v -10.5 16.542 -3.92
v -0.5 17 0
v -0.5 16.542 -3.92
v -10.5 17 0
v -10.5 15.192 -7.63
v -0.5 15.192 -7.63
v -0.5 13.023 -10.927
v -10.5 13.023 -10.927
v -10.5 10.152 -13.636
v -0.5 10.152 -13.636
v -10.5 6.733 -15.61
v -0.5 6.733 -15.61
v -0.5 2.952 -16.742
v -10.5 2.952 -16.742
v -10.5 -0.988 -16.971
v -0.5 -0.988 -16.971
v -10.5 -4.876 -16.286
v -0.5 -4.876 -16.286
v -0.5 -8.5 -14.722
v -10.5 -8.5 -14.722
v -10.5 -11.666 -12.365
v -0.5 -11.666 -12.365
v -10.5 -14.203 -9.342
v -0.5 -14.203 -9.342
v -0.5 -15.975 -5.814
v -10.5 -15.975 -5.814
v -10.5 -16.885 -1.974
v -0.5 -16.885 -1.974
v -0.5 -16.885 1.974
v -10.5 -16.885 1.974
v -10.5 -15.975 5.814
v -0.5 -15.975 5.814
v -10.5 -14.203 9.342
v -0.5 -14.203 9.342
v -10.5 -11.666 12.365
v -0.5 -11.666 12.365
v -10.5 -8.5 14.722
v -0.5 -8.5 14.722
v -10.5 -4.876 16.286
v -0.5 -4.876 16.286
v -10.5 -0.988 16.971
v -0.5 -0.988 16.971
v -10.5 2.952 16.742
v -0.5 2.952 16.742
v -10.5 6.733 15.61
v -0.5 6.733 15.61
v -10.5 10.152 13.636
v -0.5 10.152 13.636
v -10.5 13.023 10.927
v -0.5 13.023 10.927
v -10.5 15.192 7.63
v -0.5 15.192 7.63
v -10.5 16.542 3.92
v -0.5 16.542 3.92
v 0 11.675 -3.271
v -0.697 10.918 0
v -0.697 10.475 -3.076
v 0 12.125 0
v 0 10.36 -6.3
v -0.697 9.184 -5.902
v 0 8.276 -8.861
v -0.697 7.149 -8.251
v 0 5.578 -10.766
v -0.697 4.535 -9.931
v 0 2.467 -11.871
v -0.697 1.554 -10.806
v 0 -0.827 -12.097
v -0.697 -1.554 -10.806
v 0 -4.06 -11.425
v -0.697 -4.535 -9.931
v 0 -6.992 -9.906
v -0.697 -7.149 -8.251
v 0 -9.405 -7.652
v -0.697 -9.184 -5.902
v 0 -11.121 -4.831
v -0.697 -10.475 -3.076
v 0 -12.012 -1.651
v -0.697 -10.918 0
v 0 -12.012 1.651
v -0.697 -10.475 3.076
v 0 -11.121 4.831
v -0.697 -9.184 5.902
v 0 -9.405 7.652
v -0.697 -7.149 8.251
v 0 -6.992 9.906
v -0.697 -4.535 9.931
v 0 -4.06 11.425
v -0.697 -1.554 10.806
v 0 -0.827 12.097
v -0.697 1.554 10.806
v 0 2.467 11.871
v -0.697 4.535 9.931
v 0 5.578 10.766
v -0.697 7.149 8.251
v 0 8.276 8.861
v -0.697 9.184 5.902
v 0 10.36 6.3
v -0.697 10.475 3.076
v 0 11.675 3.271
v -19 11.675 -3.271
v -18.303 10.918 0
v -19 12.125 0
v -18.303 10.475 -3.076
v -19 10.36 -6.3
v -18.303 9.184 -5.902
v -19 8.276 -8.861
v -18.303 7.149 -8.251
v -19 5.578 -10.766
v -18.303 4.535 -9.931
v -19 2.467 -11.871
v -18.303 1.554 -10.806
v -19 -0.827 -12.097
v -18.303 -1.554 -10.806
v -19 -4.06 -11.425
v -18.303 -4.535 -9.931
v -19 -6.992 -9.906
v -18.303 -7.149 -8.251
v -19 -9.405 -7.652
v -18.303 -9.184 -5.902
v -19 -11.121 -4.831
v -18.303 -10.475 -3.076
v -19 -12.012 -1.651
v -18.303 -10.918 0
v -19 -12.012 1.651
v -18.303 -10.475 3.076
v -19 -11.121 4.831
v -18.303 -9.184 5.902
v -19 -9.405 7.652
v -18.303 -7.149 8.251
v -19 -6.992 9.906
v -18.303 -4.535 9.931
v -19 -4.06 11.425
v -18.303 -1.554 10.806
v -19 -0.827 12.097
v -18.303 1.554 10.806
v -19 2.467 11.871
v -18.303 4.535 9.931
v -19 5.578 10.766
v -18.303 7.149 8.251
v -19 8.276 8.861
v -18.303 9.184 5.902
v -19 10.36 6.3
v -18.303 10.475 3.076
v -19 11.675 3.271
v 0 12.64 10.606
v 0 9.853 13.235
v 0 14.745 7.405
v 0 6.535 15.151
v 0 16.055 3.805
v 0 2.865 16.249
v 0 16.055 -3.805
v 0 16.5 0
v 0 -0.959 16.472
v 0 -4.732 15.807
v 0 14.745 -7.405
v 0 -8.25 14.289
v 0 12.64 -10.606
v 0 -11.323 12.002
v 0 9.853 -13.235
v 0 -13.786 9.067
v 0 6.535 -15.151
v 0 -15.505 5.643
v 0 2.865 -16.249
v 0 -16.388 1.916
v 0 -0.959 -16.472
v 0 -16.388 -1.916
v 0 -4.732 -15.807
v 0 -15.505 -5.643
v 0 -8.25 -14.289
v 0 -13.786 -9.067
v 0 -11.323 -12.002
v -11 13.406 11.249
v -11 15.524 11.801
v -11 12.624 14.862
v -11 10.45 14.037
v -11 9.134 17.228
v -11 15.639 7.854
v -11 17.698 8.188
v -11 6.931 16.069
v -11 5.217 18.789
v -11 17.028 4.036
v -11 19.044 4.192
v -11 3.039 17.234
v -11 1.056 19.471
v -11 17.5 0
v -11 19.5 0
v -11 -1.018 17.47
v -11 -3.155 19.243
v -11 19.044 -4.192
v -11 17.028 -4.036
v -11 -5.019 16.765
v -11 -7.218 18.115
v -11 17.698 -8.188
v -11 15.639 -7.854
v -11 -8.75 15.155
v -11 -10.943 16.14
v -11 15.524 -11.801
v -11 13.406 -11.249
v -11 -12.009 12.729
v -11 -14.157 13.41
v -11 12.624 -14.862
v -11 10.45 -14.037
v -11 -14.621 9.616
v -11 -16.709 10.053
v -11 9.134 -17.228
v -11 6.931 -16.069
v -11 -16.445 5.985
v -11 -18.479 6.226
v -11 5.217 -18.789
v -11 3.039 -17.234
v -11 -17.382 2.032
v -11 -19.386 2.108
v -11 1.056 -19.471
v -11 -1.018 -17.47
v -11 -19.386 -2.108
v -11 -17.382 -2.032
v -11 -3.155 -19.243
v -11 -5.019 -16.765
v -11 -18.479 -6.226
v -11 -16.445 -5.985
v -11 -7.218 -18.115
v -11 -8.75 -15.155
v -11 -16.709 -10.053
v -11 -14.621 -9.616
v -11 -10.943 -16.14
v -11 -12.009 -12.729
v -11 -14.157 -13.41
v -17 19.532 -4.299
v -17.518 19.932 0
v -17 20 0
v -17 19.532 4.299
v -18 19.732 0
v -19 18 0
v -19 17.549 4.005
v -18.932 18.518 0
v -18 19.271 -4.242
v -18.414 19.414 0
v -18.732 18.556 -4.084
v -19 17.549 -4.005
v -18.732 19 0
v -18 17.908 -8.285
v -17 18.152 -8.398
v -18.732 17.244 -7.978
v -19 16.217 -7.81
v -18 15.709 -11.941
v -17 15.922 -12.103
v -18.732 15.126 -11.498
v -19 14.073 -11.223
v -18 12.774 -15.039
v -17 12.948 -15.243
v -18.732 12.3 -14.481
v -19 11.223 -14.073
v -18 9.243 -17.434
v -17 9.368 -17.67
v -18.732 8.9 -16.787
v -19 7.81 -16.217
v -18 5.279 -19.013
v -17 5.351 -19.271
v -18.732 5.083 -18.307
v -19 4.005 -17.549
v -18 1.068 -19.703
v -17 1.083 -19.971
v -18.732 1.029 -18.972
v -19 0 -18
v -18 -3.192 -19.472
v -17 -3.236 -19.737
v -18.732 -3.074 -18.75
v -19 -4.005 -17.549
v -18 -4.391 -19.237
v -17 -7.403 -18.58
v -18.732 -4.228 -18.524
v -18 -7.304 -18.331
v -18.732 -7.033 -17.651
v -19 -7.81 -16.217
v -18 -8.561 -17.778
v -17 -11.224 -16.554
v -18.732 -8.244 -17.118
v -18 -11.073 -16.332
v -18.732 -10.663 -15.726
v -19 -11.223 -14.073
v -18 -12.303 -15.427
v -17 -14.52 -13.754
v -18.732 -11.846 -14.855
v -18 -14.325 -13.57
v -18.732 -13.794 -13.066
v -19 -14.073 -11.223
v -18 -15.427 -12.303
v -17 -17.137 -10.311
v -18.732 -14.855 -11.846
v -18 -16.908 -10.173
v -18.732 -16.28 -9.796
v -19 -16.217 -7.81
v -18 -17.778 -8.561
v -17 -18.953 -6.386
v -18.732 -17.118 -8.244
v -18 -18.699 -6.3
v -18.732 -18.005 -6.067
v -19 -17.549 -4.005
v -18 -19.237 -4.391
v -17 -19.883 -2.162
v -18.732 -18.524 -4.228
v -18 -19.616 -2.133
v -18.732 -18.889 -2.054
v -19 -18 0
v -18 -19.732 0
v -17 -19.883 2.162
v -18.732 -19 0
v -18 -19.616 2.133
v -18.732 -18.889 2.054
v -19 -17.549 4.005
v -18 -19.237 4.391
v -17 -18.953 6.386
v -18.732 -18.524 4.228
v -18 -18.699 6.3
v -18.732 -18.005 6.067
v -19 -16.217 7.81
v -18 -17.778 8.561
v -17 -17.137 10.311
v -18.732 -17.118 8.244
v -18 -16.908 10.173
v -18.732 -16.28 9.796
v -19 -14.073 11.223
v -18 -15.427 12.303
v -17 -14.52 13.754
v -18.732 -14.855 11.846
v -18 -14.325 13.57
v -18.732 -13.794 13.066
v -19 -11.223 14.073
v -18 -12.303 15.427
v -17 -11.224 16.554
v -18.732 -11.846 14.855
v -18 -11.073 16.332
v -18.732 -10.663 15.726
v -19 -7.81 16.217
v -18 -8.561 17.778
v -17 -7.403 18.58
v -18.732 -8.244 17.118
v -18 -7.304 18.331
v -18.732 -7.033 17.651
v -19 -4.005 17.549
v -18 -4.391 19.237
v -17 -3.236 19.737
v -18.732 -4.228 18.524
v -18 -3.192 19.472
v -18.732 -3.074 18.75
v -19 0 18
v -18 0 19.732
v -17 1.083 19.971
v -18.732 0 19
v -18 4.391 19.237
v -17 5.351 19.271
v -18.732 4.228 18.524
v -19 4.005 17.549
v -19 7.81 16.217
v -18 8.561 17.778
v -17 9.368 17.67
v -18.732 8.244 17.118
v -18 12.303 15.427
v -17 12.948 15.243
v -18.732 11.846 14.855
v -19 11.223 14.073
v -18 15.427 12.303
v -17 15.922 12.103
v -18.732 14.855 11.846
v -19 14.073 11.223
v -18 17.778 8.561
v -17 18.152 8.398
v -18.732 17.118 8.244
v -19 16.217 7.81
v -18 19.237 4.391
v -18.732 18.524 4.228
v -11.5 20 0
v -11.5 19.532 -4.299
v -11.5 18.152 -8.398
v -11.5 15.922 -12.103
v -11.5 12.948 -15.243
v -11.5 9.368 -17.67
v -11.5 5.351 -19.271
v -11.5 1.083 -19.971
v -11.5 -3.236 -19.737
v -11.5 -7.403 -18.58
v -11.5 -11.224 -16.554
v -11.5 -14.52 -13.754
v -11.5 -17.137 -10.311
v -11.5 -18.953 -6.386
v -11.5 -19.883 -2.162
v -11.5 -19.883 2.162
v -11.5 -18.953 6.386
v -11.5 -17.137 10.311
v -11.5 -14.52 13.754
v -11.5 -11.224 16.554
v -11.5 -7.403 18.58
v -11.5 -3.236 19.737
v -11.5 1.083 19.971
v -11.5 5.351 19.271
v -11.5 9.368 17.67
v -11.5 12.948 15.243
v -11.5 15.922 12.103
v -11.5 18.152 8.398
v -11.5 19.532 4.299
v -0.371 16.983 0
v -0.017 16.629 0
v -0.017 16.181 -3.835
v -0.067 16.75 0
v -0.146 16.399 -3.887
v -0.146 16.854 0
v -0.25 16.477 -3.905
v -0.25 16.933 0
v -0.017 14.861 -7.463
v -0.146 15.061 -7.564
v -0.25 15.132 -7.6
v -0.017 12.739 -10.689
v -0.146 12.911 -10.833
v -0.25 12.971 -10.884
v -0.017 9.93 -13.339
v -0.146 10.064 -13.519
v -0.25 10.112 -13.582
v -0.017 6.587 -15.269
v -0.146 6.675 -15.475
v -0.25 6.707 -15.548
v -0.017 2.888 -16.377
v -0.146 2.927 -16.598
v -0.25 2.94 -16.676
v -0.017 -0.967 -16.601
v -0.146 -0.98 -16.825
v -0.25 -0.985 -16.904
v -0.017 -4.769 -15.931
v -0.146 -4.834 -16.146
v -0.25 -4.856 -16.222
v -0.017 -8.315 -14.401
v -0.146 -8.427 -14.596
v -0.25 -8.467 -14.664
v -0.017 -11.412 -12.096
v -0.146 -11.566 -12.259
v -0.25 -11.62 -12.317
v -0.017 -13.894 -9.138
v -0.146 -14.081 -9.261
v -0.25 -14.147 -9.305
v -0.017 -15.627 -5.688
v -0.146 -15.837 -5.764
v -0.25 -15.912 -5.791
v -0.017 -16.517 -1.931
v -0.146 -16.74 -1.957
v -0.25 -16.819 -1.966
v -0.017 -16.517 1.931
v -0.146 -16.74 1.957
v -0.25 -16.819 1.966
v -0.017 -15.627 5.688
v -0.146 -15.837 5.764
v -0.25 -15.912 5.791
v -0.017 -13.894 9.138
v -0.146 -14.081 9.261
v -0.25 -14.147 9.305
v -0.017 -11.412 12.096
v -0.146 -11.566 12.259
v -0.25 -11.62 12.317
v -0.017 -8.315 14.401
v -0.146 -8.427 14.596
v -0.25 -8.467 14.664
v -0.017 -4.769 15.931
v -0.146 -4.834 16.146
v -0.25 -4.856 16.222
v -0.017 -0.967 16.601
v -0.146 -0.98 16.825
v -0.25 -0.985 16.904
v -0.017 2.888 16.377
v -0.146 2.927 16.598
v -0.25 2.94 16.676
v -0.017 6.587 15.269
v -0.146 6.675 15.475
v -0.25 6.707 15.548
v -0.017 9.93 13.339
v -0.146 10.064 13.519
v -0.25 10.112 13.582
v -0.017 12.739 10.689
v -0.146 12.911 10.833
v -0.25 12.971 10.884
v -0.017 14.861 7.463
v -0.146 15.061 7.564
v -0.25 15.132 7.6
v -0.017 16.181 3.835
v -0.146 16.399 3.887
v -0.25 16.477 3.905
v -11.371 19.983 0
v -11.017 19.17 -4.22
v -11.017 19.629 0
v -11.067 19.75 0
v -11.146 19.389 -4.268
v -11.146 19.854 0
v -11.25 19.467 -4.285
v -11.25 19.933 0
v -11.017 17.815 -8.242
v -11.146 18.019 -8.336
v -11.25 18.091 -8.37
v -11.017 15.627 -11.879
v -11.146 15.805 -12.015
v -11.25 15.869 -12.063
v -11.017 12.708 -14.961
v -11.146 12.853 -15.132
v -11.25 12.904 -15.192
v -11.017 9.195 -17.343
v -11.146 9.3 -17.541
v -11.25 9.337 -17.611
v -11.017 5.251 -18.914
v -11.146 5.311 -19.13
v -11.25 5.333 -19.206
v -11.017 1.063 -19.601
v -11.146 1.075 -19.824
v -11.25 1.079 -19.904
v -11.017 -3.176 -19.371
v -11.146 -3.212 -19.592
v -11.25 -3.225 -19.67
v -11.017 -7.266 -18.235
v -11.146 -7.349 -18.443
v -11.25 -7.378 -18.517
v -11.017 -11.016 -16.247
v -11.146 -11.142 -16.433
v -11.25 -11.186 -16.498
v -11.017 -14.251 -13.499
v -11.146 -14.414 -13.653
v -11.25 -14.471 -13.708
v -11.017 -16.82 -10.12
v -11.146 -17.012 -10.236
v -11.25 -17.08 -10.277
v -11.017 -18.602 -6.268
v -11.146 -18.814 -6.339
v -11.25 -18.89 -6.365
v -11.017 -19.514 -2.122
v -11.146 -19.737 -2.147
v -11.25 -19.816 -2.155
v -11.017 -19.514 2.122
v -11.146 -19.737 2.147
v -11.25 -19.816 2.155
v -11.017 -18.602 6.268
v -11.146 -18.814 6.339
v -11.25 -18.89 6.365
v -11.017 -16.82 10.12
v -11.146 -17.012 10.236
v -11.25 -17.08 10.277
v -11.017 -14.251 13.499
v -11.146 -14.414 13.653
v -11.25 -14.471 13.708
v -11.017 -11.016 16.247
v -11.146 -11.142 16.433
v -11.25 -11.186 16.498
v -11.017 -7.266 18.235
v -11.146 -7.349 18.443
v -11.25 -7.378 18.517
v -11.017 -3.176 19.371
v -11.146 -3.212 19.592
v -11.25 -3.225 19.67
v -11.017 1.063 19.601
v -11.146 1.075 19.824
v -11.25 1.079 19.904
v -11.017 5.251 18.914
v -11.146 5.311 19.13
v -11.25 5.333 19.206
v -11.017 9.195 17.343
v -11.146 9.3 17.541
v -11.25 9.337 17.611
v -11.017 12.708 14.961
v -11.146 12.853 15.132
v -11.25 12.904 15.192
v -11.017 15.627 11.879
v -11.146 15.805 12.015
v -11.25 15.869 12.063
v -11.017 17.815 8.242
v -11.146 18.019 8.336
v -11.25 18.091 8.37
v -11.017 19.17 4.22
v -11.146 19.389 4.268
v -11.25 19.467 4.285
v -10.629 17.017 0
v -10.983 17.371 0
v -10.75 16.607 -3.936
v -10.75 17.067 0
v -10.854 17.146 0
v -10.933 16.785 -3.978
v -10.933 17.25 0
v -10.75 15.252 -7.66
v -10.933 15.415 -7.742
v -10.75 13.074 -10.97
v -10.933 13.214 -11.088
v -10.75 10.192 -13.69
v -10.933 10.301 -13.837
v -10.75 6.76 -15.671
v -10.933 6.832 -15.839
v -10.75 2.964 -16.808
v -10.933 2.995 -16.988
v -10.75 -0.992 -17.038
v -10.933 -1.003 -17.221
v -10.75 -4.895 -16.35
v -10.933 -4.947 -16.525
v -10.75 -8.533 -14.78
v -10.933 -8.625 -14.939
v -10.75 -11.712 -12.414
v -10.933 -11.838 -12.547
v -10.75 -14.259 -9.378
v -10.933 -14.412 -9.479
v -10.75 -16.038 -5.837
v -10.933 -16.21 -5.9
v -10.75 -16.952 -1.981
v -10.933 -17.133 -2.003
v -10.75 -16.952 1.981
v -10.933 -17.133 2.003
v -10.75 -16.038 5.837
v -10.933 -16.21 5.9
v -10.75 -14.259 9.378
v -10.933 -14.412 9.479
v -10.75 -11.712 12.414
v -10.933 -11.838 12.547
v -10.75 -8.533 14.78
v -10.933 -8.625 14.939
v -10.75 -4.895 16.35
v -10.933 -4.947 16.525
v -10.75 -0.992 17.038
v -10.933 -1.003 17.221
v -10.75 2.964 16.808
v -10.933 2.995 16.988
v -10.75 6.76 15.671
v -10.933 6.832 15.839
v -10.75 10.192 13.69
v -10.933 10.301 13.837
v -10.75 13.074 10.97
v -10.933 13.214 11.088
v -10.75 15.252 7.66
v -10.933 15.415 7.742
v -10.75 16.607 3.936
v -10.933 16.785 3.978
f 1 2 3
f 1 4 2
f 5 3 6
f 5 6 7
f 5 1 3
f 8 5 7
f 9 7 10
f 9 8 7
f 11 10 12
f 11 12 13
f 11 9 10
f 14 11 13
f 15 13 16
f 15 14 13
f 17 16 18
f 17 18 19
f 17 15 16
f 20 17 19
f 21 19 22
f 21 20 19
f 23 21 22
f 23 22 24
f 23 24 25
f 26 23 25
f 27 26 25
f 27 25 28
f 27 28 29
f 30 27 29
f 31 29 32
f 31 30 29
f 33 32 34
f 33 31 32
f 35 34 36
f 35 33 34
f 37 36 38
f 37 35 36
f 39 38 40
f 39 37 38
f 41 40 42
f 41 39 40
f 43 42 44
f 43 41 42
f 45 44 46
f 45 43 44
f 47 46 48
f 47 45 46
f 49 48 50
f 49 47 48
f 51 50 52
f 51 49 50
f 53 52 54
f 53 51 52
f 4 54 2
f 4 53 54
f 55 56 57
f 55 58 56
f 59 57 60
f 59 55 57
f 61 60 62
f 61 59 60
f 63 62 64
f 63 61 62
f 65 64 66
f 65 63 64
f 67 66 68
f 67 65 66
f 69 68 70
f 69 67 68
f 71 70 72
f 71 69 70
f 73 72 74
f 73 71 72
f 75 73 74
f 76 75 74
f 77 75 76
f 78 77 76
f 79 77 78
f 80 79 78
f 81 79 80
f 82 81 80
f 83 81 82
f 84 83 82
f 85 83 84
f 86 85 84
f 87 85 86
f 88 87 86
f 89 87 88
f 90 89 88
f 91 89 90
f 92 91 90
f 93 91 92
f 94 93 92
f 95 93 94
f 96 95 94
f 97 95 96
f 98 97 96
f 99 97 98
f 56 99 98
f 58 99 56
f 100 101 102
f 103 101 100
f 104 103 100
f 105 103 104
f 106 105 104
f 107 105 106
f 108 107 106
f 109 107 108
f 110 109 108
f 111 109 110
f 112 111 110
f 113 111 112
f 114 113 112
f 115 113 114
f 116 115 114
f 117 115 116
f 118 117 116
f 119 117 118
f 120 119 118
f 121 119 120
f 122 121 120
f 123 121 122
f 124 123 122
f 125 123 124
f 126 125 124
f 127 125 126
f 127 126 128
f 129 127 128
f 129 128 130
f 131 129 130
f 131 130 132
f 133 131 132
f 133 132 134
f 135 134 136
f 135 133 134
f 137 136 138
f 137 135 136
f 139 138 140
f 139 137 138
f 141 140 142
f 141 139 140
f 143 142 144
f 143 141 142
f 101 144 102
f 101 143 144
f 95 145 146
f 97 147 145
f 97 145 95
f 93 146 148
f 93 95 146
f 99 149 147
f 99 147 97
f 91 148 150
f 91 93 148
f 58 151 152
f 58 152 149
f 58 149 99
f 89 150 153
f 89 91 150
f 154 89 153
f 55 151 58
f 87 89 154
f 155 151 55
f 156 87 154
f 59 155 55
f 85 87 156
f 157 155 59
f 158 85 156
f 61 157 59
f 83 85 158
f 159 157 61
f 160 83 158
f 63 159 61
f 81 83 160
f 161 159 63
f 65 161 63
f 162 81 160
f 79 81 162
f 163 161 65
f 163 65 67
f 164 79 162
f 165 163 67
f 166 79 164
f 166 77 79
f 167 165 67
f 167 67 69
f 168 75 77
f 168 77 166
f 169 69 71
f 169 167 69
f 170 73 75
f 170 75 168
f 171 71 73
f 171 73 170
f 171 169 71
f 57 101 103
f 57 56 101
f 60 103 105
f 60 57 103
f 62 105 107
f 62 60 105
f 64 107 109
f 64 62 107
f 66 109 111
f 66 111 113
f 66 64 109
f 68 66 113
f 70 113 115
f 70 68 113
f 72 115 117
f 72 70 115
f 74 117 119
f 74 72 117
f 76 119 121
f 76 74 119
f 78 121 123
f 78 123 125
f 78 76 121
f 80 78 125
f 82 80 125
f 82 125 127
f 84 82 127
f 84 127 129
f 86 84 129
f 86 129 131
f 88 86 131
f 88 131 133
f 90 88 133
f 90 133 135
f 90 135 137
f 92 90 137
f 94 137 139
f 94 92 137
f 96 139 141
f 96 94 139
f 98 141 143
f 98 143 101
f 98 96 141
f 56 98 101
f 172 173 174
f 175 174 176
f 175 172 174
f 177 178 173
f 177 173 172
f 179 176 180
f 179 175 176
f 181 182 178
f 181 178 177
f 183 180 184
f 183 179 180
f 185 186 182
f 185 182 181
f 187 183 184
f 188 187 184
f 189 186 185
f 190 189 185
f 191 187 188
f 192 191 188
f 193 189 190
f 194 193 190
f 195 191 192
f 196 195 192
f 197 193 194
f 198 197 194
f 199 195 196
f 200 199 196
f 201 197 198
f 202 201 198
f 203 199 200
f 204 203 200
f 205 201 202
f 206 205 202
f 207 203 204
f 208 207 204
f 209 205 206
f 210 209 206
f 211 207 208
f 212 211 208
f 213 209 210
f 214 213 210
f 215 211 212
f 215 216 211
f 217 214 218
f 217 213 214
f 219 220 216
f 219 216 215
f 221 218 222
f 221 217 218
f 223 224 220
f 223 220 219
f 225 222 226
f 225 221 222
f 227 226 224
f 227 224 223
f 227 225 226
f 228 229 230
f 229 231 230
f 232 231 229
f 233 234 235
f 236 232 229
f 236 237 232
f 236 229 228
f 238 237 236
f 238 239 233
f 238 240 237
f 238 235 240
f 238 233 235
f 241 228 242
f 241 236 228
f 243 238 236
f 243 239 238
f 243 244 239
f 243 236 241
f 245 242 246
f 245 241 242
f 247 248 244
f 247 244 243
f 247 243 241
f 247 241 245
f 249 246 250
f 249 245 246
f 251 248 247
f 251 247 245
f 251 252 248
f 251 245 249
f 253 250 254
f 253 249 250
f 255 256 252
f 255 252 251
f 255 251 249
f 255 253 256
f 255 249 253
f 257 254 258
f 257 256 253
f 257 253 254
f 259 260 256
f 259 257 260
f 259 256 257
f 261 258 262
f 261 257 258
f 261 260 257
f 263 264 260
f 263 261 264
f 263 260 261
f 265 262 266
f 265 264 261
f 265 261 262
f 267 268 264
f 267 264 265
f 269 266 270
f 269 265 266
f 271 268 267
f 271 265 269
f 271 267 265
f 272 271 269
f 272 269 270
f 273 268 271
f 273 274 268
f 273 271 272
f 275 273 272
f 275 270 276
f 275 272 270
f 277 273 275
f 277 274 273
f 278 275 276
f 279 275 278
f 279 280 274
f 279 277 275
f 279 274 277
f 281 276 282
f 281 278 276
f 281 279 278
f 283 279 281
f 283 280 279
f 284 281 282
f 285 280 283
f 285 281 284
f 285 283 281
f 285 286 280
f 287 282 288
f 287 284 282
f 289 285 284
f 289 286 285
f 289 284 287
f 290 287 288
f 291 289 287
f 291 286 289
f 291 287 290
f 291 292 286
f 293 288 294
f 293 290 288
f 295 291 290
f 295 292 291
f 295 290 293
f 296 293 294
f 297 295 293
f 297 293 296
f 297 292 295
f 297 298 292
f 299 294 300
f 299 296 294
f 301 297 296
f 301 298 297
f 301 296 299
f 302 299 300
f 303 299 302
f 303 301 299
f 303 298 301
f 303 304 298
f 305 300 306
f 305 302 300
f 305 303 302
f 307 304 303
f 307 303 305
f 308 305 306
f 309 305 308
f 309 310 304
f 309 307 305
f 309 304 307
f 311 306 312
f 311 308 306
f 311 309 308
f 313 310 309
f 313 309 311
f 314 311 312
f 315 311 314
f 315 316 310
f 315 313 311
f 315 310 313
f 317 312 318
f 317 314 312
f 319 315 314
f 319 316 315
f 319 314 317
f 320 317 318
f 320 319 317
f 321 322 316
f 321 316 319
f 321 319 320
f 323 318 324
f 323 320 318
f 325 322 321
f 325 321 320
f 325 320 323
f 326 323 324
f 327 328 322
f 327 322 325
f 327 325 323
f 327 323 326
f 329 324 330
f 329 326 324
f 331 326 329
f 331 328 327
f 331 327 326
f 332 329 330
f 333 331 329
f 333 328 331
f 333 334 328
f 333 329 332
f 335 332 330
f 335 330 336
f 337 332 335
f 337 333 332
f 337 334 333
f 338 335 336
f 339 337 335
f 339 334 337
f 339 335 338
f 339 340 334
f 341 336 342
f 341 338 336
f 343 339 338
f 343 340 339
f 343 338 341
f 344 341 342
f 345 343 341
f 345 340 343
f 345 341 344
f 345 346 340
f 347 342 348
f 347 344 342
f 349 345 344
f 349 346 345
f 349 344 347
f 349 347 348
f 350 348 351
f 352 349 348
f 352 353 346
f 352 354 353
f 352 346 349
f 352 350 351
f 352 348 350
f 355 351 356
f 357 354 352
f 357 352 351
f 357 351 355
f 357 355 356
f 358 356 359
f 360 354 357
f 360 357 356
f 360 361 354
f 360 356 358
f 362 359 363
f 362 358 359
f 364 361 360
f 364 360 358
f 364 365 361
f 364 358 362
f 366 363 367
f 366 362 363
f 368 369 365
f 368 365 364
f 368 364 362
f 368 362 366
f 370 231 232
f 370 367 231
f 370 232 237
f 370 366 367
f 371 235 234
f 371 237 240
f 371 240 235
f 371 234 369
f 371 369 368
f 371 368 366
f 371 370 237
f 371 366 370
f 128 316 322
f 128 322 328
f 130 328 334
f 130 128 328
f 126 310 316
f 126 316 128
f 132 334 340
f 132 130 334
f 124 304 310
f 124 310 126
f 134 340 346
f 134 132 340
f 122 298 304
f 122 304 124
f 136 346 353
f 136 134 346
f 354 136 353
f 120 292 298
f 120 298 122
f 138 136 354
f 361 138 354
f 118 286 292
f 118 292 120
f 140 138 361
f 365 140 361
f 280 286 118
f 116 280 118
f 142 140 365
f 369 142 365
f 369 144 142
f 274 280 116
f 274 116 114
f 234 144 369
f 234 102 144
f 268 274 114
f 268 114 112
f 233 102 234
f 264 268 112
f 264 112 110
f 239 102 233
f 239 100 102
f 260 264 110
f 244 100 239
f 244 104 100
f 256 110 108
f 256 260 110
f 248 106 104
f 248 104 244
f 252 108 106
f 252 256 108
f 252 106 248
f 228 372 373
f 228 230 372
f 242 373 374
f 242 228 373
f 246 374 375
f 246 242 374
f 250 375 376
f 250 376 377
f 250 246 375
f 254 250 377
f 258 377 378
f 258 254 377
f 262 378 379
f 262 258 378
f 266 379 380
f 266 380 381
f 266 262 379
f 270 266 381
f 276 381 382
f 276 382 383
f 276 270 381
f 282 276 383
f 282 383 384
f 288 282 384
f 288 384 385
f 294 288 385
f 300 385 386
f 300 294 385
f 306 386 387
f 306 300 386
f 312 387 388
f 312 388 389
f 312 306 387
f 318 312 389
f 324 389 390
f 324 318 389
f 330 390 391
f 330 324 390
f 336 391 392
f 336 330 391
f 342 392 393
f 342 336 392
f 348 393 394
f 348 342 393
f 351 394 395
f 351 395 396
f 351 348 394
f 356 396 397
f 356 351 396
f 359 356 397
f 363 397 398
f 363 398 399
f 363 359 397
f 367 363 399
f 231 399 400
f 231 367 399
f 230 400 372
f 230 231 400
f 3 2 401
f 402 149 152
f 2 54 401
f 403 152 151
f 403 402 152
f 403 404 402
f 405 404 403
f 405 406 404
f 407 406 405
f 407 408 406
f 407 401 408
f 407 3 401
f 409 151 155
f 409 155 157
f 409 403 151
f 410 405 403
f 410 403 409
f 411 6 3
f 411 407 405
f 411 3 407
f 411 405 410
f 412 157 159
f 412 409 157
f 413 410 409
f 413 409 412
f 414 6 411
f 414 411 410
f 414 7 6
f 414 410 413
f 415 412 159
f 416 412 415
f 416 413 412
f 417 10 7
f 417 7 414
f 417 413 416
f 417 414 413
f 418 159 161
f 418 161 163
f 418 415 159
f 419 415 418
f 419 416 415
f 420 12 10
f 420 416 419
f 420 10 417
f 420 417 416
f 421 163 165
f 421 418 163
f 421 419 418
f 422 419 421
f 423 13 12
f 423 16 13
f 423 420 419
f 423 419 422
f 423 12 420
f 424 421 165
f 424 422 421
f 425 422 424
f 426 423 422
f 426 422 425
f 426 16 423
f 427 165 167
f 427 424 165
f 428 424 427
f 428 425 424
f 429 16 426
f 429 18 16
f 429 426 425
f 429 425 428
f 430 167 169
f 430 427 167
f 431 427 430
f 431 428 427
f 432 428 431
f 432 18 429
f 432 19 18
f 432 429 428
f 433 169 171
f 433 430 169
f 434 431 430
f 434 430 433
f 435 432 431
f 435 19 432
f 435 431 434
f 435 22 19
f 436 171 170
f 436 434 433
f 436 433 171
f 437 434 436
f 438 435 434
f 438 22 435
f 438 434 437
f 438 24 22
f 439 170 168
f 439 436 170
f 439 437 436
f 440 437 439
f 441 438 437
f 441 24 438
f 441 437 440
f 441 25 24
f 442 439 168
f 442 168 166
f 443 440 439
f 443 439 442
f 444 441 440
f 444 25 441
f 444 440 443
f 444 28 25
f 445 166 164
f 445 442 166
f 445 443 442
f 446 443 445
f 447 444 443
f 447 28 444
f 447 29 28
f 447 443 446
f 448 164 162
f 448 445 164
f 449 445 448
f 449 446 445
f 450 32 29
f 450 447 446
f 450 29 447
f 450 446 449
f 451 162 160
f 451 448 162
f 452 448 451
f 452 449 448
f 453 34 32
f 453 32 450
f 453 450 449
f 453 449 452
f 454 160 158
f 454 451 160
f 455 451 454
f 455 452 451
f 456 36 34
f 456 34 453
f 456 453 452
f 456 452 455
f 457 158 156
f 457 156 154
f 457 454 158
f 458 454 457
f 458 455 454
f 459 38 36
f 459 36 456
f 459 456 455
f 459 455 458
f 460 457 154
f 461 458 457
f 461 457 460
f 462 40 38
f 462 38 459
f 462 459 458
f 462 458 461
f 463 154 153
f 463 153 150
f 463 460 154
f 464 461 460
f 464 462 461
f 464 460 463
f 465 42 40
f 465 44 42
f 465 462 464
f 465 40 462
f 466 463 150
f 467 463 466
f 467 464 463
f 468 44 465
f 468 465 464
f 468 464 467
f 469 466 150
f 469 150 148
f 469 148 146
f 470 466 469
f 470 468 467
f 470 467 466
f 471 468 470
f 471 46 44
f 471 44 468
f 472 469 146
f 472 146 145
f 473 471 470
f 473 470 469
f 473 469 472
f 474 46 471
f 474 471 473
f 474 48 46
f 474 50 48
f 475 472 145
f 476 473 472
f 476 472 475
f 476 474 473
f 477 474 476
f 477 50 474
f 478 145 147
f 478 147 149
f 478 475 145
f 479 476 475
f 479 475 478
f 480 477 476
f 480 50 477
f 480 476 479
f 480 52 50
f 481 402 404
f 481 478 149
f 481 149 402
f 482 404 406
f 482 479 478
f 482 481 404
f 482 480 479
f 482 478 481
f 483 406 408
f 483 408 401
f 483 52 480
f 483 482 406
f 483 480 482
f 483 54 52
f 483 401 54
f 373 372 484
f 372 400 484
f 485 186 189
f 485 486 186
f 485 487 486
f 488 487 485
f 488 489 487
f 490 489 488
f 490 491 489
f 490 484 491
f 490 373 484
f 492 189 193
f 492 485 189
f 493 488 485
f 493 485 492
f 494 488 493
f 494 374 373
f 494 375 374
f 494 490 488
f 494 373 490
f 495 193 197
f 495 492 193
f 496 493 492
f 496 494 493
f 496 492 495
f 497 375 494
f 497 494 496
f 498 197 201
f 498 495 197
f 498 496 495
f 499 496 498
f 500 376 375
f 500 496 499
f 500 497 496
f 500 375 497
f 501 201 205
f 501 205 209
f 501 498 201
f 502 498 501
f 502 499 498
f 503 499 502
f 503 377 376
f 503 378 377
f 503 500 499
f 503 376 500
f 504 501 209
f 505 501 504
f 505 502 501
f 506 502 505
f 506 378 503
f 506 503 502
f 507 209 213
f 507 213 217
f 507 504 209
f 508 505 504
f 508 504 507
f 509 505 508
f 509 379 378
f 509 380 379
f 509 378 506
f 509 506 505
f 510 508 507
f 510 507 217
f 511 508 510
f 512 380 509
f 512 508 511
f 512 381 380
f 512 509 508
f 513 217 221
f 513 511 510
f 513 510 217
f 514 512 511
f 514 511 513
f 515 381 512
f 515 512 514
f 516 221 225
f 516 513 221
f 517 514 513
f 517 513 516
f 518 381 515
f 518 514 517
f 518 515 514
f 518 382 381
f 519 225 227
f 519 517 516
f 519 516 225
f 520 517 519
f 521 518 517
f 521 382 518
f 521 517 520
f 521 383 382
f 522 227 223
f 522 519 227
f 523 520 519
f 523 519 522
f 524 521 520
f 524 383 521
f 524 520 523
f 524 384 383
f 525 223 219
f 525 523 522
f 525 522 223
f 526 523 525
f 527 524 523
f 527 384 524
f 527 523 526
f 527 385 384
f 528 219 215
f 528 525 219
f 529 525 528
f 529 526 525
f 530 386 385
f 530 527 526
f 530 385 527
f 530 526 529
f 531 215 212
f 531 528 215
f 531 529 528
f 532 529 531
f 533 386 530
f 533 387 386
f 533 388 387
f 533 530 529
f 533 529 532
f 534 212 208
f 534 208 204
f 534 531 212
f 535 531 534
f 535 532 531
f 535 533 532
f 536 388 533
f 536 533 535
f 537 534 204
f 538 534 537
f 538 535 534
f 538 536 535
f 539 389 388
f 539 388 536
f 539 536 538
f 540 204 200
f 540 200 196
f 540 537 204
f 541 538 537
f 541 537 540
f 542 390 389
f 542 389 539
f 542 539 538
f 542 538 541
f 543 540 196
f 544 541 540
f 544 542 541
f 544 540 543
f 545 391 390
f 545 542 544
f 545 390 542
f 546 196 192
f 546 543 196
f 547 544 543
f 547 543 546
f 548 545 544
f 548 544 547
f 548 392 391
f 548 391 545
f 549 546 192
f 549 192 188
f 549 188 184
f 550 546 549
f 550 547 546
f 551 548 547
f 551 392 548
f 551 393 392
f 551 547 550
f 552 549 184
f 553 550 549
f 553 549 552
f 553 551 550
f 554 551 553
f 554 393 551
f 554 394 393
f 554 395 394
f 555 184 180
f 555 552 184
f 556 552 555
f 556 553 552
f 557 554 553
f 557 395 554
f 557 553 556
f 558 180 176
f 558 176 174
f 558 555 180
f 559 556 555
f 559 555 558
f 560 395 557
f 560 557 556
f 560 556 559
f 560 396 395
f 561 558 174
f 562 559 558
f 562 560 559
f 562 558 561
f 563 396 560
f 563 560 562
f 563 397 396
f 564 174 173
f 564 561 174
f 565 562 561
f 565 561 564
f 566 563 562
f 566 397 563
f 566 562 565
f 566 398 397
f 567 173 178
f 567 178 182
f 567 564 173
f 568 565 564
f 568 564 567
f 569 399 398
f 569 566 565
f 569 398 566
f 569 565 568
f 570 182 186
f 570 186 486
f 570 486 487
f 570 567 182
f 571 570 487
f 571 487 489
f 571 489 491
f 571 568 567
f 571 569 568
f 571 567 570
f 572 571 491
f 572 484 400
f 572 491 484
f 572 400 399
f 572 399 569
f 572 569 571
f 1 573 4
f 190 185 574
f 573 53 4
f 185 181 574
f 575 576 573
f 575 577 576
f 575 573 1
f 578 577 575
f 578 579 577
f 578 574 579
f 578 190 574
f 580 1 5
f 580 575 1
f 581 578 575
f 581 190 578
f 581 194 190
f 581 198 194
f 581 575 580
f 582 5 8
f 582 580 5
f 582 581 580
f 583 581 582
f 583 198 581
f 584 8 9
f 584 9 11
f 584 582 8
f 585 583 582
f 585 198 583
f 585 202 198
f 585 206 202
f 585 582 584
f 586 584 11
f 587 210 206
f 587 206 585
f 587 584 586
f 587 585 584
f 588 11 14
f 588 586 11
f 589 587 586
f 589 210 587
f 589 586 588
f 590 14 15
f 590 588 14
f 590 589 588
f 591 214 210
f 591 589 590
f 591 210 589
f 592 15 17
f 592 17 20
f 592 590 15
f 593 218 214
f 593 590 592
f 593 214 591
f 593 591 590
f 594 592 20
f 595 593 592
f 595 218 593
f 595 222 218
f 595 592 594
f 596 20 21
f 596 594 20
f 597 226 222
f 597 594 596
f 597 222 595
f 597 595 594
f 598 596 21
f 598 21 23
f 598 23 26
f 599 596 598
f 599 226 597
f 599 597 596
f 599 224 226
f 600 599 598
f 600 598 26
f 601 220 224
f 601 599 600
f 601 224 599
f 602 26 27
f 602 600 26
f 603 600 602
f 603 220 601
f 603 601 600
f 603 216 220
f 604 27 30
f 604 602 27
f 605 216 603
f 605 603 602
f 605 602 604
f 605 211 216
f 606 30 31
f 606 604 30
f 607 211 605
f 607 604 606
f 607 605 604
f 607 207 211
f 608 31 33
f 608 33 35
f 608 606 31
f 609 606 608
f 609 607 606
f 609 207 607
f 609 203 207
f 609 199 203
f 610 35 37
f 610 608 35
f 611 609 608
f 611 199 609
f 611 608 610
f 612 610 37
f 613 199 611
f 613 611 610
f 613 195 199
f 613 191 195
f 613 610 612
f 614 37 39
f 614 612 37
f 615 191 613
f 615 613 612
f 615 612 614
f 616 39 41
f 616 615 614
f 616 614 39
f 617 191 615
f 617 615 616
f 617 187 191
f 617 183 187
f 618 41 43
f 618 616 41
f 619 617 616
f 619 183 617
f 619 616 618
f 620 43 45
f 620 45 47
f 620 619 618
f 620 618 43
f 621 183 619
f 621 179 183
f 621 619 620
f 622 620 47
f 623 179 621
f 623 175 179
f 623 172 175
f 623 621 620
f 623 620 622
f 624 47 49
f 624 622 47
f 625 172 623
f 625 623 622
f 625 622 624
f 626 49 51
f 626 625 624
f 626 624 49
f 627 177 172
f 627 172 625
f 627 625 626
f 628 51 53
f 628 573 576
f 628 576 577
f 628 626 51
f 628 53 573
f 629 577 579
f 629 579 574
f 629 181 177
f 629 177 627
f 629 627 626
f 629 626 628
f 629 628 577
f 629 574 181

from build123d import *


with BuildPart() as part:
    # Sketch1 → Base-Revolve (revolve)
    with BuildSketch(Plane.XY):
        with BuildLine():
            Line((0, 12.125), (0, 16.5))
            ThreePointArc((0, 16.5), (-0.146446609, 16.853553391), (-0.5, 17))
            Line((-0.5, 17), (-10.5, 17))
            ThreePointArc((-10.5, 17), (-10.853553391, 17.146446609), (-11, 17.5))
            Line((-11, 17.5), (-11, 19.5))
            ThreePointArc((-11, 19.5), (-11.146446609, 19.853553391), (-11.5, 20))
            Line((-11.5, 20), (-17, 20))
            ThreePointArc((-17, 20), (-18.414213562, 19.414213562), (-19, 18))
            Line((-19, 18), (-19, 12.125))
            Line((-19, 12.125), (-18.30284955, 10.9175))
            Line((-18.30284955, 10.9175), (-0.69715045, 10.9175))
            Line((-0.69715045, 10.9175), (0, 12.125))
        make_face()
    revolve(axis=Axis((0, 0, 0), (-1, 0, 0)))


solid = part.part
